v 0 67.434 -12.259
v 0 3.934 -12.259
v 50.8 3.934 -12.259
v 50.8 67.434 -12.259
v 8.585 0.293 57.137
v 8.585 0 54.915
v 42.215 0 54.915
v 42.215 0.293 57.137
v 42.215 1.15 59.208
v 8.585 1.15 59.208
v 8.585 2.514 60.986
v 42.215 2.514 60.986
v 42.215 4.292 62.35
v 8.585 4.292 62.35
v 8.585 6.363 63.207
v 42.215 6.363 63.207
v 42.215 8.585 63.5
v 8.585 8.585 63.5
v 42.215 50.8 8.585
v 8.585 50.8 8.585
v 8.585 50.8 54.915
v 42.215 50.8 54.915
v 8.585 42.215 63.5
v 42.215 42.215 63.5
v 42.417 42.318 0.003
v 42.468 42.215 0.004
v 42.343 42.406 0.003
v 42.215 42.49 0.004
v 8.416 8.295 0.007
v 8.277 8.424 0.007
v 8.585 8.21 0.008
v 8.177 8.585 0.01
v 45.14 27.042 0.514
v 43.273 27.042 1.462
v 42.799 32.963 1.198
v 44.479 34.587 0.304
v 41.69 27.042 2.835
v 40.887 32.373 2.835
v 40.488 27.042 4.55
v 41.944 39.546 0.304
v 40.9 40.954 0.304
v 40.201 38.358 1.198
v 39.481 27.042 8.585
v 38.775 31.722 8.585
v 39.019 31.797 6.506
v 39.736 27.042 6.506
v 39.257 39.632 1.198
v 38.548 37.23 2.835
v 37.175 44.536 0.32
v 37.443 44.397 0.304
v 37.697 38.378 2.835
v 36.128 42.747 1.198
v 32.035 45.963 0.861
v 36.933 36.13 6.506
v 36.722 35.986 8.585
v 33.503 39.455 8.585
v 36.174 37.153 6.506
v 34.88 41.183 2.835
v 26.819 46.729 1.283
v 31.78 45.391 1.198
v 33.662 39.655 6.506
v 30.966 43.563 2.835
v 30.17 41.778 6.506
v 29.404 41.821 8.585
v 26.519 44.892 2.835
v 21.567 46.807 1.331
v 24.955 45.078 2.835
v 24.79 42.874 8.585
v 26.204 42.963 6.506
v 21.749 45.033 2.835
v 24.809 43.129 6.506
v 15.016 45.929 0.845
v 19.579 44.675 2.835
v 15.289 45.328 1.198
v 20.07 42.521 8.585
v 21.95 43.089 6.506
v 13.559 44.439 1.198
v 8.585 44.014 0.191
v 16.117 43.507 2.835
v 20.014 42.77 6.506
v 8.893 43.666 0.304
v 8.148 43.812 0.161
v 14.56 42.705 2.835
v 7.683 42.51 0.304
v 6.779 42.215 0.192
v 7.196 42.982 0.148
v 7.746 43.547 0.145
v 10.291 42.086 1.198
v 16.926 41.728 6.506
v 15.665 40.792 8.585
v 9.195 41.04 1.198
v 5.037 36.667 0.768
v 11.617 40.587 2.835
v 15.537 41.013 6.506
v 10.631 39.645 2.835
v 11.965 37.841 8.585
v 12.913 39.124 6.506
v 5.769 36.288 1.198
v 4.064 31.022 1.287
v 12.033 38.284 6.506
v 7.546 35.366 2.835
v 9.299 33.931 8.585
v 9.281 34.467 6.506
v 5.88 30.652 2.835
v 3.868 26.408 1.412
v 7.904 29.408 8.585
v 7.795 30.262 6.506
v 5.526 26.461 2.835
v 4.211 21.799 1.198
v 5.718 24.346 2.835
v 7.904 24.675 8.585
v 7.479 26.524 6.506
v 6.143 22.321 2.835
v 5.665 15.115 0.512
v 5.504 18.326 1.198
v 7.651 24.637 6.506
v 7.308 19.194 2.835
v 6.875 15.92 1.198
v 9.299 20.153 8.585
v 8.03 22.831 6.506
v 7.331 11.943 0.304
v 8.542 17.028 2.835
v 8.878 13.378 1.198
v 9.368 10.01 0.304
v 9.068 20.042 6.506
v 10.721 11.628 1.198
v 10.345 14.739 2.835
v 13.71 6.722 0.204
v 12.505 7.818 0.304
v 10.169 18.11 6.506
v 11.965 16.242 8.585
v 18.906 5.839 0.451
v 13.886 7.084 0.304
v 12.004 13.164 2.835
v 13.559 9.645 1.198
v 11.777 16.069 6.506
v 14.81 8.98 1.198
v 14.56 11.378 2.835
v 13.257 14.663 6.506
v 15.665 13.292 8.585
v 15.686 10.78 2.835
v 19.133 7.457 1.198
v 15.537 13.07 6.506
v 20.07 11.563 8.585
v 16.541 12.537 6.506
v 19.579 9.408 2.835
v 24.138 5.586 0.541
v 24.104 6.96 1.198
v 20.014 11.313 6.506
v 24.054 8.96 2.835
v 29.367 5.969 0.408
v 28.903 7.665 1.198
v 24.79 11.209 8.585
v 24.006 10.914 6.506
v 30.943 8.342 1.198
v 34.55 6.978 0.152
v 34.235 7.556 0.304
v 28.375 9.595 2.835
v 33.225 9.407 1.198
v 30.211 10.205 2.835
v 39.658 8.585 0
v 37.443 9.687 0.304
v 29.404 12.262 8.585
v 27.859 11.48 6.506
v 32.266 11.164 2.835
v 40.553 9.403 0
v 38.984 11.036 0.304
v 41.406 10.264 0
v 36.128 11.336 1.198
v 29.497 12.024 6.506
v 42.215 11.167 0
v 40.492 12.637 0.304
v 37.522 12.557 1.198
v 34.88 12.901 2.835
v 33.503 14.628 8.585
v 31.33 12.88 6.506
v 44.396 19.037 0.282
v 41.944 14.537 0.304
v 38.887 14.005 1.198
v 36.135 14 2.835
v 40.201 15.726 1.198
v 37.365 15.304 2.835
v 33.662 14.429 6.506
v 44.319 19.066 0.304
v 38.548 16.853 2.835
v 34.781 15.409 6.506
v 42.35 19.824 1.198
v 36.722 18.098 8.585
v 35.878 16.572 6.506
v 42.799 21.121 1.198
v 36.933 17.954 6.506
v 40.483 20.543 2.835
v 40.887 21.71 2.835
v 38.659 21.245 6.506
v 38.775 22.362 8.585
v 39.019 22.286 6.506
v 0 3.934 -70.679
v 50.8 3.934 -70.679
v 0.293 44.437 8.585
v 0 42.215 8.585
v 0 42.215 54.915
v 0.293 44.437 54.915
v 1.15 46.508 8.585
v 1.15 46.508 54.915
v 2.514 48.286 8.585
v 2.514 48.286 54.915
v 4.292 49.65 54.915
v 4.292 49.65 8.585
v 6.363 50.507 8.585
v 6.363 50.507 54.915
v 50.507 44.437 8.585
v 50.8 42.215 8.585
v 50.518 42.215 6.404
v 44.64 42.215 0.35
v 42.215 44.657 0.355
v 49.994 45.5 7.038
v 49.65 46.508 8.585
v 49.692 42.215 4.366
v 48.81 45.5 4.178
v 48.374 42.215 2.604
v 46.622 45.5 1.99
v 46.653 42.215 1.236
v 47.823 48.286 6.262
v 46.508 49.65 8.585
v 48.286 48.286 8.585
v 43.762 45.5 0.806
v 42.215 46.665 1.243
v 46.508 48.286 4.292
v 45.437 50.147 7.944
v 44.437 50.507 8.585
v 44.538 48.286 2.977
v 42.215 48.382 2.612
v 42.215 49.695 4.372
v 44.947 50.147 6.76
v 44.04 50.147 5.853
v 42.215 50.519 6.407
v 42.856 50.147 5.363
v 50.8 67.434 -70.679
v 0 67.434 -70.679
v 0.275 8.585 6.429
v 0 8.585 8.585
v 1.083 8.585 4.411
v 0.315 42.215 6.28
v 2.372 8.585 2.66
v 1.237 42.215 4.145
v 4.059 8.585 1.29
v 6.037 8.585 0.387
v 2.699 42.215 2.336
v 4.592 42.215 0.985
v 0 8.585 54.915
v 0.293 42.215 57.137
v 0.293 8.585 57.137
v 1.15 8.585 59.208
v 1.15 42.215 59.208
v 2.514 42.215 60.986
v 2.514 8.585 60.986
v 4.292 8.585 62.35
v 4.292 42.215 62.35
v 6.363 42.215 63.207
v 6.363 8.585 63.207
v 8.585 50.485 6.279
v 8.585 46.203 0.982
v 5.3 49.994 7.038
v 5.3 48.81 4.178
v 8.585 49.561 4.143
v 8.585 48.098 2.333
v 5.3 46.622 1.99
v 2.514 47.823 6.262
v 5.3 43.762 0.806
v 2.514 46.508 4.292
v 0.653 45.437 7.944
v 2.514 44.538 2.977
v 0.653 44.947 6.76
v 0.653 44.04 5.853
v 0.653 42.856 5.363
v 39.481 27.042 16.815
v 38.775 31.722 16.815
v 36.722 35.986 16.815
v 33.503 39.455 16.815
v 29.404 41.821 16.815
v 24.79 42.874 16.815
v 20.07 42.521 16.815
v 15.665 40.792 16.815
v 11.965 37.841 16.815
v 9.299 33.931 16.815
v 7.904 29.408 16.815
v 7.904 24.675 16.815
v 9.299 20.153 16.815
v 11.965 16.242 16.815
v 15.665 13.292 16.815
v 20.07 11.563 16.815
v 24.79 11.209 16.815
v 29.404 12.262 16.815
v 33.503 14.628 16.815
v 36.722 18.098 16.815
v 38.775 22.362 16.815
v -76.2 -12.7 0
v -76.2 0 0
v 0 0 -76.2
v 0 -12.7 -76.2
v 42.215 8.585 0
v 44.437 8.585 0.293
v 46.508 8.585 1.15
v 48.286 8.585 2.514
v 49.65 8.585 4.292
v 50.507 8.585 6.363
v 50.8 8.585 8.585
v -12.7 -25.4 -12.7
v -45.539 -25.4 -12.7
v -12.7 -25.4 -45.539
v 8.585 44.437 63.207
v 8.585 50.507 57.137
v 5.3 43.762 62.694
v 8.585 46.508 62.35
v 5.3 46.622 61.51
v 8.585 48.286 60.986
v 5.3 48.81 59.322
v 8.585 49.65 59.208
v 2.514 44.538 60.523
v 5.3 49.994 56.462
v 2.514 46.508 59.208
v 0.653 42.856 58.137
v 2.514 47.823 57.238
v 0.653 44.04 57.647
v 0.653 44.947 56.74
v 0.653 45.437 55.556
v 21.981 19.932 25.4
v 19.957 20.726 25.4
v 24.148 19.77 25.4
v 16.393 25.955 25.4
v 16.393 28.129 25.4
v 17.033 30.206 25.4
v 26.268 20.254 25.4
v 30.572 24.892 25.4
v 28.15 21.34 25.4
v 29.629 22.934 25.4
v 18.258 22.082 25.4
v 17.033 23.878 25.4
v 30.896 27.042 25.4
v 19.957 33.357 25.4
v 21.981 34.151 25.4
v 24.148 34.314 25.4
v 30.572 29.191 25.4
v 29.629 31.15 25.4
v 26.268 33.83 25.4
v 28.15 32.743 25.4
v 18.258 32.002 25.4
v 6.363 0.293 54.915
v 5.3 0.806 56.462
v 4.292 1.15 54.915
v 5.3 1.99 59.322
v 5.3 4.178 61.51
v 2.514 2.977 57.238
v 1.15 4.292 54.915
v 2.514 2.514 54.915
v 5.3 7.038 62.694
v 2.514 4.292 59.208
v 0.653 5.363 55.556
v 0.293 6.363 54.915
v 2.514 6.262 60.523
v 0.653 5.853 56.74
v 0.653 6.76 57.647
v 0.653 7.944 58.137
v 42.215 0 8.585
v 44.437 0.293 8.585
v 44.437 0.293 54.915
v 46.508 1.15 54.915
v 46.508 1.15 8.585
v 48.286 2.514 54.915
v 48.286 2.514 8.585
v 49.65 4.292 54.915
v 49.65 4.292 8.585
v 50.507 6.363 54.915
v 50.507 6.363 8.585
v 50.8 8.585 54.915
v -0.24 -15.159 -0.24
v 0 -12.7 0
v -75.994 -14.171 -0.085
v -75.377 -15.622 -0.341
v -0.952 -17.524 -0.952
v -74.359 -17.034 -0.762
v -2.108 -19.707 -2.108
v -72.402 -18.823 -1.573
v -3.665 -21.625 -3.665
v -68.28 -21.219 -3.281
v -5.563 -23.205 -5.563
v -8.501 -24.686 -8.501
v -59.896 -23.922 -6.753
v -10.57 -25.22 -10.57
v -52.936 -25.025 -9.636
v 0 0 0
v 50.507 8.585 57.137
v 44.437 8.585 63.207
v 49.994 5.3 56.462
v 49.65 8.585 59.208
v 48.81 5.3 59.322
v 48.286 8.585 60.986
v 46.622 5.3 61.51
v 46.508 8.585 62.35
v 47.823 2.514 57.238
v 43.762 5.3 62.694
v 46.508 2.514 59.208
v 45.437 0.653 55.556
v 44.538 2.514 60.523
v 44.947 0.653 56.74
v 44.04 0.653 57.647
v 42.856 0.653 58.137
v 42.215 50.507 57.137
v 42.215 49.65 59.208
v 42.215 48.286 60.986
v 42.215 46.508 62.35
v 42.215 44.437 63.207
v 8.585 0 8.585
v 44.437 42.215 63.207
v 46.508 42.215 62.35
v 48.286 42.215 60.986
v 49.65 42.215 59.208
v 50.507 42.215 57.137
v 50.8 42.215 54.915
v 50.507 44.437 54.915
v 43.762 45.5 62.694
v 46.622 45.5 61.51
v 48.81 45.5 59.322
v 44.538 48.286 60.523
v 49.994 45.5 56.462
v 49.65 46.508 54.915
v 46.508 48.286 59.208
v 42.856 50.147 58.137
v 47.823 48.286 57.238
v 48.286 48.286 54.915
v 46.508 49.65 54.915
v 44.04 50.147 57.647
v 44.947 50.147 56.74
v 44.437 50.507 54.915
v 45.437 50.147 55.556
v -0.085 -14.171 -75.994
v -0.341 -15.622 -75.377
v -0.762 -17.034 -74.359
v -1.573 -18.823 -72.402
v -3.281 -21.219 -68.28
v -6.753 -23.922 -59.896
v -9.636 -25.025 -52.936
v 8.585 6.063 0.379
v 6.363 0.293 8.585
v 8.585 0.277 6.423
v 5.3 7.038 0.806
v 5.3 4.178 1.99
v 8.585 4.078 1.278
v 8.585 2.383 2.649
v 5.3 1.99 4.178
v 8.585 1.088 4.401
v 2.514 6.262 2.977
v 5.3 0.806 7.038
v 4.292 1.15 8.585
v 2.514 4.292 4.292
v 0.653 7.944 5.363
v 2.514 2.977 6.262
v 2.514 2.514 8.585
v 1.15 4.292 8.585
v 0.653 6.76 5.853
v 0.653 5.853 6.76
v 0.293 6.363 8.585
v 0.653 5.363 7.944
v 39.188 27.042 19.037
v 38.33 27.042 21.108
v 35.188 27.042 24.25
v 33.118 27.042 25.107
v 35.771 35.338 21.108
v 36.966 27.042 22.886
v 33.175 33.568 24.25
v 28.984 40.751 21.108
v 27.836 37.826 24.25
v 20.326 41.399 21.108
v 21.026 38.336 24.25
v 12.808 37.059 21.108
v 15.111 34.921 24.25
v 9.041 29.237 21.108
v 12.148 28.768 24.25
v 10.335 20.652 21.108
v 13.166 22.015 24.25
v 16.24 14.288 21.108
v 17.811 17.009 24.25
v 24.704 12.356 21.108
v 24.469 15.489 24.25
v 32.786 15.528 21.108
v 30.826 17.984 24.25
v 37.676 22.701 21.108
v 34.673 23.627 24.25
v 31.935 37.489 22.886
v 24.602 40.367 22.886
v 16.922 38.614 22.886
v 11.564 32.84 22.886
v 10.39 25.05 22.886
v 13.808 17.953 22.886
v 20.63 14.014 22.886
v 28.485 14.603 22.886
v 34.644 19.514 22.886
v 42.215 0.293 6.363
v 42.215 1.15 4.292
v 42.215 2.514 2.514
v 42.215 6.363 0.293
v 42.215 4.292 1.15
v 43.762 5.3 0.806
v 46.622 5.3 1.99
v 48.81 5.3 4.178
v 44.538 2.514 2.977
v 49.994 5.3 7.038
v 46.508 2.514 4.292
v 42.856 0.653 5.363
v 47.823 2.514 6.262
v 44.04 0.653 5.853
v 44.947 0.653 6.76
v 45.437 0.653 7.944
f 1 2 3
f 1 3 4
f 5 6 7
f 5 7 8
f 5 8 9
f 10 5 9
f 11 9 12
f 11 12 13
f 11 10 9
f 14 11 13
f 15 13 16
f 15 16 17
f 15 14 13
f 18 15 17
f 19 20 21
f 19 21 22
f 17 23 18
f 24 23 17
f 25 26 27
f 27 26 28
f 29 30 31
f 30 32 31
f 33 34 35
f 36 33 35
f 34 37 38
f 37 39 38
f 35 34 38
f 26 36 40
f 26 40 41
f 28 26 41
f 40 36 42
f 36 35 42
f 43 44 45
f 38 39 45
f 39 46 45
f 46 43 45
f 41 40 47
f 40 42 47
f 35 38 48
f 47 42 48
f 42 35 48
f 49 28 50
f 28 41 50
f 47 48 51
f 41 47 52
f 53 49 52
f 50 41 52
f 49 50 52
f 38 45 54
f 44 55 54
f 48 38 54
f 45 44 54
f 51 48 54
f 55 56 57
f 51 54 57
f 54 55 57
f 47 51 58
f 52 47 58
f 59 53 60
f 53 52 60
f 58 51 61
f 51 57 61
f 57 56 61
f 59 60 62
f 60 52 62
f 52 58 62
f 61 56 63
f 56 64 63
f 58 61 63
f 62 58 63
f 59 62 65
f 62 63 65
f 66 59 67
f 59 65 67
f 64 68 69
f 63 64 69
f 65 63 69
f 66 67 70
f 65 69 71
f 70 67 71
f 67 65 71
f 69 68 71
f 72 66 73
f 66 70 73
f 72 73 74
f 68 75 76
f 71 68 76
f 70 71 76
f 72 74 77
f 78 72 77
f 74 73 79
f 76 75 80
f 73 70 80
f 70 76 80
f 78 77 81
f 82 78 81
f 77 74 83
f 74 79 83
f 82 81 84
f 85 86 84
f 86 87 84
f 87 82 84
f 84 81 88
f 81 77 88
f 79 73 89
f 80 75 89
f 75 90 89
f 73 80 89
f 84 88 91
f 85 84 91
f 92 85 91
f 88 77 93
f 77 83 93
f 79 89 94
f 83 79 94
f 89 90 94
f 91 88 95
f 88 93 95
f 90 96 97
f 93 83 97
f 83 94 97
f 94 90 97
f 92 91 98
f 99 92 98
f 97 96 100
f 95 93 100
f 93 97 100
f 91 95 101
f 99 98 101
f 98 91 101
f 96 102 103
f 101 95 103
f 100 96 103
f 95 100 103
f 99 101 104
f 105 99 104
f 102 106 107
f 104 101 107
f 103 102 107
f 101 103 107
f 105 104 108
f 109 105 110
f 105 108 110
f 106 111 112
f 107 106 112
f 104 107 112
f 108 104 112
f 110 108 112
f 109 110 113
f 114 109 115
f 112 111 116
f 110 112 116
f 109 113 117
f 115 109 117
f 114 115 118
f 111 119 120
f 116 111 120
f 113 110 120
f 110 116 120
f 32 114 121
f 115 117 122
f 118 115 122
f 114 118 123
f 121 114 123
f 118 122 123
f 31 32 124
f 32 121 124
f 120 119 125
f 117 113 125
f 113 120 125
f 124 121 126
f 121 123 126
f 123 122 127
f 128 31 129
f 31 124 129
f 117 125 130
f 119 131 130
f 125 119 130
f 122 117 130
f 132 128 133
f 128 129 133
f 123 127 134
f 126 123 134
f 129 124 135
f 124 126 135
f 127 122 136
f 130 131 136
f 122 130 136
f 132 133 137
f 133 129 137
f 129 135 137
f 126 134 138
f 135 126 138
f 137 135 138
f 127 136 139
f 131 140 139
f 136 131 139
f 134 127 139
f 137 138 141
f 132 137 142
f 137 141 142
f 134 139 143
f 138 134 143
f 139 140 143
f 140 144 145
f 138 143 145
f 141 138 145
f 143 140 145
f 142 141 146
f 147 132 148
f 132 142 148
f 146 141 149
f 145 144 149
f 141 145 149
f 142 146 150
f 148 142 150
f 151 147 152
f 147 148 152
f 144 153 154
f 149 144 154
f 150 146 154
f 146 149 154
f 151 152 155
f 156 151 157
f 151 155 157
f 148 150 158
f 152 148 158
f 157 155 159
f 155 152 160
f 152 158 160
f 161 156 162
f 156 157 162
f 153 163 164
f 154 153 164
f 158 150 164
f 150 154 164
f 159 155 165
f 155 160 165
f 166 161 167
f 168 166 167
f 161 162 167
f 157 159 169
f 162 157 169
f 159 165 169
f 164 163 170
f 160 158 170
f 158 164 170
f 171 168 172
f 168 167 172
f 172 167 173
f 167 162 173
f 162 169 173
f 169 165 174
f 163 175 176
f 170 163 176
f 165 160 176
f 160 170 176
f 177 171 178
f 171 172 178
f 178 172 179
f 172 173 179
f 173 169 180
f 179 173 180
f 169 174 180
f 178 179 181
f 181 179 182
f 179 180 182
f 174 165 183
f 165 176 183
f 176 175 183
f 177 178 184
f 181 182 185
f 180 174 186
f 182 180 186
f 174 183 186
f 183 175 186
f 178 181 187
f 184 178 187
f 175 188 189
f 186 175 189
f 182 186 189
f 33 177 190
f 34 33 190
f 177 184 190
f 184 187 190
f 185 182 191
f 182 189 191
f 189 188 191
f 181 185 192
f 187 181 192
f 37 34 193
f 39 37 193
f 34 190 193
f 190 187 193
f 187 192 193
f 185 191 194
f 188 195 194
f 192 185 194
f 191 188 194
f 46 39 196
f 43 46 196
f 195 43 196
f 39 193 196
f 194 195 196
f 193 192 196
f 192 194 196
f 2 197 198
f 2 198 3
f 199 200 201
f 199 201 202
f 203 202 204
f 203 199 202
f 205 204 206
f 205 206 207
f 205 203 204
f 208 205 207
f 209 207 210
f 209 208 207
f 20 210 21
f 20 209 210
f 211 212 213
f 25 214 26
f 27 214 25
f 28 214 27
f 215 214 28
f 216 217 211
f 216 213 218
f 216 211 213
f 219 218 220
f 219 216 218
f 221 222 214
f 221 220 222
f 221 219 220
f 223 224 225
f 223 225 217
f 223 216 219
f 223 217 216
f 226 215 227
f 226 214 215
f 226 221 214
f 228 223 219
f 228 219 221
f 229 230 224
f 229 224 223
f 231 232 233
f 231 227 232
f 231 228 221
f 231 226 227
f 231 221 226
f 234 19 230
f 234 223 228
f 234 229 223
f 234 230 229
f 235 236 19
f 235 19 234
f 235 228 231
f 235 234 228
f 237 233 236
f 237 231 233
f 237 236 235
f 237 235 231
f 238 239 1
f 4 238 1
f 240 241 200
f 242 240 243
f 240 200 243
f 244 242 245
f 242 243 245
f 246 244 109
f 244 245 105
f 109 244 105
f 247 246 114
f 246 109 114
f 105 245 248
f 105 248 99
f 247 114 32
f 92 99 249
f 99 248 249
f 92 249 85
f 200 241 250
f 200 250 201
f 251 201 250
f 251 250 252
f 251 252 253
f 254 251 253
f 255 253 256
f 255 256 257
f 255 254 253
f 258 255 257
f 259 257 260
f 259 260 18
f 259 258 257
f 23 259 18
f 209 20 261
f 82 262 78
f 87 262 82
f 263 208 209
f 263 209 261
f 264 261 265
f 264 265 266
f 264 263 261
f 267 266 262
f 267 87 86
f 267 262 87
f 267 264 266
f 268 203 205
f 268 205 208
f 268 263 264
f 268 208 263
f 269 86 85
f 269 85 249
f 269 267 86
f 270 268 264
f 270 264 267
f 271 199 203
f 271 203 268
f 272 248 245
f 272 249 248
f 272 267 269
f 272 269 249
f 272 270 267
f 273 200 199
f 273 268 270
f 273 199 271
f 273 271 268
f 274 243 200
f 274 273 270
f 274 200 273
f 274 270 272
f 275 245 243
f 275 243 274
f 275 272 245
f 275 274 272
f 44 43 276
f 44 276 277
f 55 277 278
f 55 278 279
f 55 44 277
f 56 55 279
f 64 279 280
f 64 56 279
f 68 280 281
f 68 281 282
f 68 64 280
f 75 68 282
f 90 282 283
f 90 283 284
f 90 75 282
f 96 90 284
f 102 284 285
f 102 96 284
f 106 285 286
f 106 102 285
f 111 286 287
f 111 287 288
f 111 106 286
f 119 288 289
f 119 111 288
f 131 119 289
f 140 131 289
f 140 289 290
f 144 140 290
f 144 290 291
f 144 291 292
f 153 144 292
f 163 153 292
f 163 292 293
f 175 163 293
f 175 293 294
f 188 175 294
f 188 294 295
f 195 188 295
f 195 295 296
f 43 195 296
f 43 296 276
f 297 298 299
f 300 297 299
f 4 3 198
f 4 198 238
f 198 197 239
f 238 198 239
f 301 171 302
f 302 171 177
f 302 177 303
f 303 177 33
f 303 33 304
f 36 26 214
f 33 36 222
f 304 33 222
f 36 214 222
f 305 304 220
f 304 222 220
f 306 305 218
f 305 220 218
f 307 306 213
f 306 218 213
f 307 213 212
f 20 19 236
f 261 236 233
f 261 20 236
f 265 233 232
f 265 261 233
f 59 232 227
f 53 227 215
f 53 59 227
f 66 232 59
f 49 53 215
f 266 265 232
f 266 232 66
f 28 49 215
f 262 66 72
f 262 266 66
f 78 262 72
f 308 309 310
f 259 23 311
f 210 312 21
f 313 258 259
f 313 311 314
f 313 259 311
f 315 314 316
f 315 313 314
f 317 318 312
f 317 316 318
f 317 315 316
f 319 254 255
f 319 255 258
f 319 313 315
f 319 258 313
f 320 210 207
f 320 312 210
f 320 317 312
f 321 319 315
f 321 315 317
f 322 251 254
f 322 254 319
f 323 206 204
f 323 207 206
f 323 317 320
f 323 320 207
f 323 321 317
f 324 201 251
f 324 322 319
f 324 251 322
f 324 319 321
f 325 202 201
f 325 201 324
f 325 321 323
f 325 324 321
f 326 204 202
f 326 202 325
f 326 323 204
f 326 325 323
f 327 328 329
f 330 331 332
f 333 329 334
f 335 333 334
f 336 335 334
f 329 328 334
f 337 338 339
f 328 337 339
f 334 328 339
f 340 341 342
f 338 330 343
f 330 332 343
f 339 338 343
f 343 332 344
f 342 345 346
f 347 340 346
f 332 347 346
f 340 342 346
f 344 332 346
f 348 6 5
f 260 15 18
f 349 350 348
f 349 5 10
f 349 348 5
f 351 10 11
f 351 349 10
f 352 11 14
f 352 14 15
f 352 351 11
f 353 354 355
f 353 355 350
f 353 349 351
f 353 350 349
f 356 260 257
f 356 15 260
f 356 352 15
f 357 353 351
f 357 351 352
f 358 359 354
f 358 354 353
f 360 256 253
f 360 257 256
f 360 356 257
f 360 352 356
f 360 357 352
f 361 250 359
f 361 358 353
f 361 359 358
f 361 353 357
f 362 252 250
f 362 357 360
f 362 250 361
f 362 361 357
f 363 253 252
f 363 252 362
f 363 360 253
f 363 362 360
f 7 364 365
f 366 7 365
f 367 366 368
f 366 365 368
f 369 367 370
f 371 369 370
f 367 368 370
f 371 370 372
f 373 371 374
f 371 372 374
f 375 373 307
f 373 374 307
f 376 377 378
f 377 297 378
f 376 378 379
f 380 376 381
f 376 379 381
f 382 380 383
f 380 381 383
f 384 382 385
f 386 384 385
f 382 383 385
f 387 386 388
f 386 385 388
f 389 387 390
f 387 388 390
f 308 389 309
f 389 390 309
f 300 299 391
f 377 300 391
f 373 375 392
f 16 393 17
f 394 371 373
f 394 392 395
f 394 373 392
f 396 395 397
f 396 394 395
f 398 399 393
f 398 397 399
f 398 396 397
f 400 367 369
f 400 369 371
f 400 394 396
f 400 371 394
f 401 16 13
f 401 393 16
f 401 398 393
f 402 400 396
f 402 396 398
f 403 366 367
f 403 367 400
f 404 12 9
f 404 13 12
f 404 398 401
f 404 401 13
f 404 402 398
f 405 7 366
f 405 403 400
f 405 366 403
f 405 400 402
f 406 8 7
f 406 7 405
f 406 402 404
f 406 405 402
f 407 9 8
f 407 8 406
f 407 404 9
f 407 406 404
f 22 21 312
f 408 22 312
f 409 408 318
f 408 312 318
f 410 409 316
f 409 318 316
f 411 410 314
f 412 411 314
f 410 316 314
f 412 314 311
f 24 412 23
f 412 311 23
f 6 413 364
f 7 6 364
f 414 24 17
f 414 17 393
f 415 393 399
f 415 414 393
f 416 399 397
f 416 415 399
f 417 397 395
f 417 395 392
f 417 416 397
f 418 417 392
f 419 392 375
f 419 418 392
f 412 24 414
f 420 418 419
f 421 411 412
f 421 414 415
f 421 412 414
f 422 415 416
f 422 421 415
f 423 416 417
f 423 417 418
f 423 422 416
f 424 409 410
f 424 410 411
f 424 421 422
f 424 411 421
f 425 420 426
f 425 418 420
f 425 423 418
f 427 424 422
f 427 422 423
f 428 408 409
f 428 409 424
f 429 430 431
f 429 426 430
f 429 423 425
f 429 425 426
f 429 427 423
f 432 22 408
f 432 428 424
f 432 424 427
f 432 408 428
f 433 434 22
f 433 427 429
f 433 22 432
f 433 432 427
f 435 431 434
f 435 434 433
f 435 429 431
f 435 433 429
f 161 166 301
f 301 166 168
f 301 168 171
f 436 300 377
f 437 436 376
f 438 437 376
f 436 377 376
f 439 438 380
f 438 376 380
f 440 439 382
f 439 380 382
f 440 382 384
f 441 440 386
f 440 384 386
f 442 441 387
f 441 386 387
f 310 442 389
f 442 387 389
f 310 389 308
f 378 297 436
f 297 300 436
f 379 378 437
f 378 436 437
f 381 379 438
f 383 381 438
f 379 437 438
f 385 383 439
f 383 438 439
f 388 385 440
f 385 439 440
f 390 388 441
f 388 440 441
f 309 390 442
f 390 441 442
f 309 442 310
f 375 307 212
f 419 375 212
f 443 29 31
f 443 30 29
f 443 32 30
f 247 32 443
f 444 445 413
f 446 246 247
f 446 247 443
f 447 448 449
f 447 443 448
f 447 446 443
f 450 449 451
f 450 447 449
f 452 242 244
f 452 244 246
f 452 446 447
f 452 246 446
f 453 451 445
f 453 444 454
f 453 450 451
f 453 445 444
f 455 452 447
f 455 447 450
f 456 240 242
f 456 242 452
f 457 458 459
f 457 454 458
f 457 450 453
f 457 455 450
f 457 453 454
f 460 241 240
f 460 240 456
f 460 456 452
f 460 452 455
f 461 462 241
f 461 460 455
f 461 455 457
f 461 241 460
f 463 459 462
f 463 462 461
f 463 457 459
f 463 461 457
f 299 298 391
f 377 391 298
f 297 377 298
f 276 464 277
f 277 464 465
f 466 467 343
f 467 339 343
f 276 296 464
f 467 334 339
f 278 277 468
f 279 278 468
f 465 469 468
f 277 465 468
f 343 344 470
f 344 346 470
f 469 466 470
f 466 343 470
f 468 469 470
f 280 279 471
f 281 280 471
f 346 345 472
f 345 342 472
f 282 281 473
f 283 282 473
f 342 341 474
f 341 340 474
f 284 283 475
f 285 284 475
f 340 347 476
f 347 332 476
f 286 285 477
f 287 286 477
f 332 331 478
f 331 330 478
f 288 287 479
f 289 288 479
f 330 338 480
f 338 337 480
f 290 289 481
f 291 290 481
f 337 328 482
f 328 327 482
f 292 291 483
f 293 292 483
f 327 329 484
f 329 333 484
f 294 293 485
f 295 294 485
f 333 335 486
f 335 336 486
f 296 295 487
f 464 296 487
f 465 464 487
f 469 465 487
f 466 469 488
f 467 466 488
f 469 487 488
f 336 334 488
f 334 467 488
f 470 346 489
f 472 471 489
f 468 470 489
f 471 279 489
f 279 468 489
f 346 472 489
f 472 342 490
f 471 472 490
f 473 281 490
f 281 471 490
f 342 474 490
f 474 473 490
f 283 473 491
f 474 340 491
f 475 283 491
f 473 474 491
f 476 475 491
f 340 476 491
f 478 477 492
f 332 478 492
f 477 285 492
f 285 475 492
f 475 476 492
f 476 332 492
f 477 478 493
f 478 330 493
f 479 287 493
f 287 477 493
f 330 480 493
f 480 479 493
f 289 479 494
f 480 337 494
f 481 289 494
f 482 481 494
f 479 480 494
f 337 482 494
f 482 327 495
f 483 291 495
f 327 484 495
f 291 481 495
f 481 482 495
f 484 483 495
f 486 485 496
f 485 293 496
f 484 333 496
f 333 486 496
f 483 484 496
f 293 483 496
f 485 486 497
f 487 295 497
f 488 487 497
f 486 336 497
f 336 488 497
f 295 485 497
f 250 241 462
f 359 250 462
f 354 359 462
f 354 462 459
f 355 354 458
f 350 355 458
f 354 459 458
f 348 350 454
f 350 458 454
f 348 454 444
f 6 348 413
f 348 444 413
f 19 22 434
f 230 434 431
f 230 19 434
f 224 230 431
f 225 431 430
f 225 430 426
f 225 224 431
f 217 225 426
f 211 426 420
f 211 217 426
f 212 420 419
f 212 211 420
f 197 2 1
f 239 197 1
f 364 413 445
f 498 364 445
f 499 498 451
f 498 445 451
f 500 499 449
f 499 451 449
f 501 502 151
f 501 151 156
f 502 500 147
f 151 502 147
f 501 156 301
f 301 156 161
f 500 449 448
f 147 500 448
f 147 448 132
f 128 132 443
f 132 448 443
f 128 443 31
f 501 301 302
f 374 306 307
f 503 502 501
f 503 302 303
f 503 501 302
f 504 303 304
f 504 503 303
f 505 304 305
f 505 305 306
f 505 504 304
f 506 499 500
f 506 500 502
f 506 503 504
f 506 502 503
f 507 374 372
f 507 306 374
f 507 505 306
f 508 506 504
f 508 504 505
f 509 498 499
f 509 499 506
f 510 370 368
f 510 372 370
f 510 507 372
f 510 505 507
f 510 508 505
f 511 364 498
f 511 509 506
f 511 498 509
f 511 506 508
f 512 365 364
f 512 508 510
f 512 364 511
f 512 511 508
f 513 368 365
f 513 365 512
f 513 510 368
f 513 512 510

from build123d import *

# Parameters (mm, degrees)
F0_W         = 50.8
F0_H         = 50.8
F1_DEPTH     = 63.5
F2_R         = 15.8771693286
F3_DEPTH     = 25.4
F5_T3_DEPTH  = 46.3301131444
F5_T5_DEPTH  = 33.6301131444
F5_T7_DEPTH  = 33.6301131444
F5_S11_W     = 8.5849434278
F5_S11_H     = 8.5849434278
F5_T12_DEPTH = 8.5849434278
F5_S17_W     = 8.5849434278
F5_S17_H     = 8.5849434278
F5_T18_DEPTH = 8.5849434278
F5_S23_W     = 8.5849434278
F5_S23_H     = 8.5849434278
F5_T24_DEPTH = 8.5849434278
F5_S29_W     = 8.5849434278
F5_S29_H     = 8.5849434278
F5_T30_DEPTH = 8.5849434278
F5_S35_W     = 8.5849434278
F5_S35_H     = 8.5849434278
F5_T36_DEPTH = 8.5849434278
F5_S41_W     = 8.5849434278
F5_S41_H     = 8.5849434278
F5_T42_DEPTH = 8.5849434278
F5_S47_W     = 8.5849434278
F5_S47_H     = 8.5849434278
F5_T48_DEPTH = 8.5849434278
F5_S53_W     = 8.5849434278
F5_S53_H     = 8.5849434278
F5_T54_DEPTH = 8.5849434278
F7_DEPTH     = 25.4
F8_R         = 12.7
F9_W         = 63.5
F9_H         = 58.42
F10_DEPTH    = 50.8


# Not quite as in the source:
# - a fillet or chamfer that OpenCascade refuses, or shapes differently, is made with other operations: its cross-section is extruded or revolved along the edge and cut away or added


with BuildPart() as f1:
    # F0 (on Top) → F1 (new body)
    with BuildSketch(Plane.XY):
        with Locations((25.4, 25.4)):
            Rectangle(F0_W, F0_H)
    extrude(amount=F1_DEPTH)


with BuildPart() as f3:
    # F2 (on Top) → F3 (new body)
    with BuildSketch(Plane.XY):
        with Locations((23.6034151167, 27.0417090505)):
            Circle(F2_R)
    extrude(amount=F3_DEPTH)


with BuildPart() as f1_1:
    add(f1.part)

    # F4: cut F3
    add(f3.part, mode=Mode.SUBTRACT)

    # F5: fillet of radius 8.5849434278 on 14 edges, made by hand

    # F5_s1 → F5_t2 (revolve)
    with BuildSketch(Plane.XZ.offset(-27.0417090505)):
        with BuildLine():
            ThreePointArc((39.4805844452, 16.8150565722), (36.9661127313, 22.8855282861), (30.8956410174, 25.4))
            Line((30.8956410174, 25.4), (39.4805844452, 25.4))
            Line((39.4805844452, 25.4), (39.4805844452, 16.8150565722))
        make_face()
    revolve(axis=Axis((23.6034151167, 27.0417090505, 25.4), (0, 0, 1)))

    # F5_s4 → F5_t3 (cut)
    with BuildSketch(Plane.XY.offset(8.5849434278)):
        with BuildLine():
            ThreePointArc((0, 42.2150565722), (2.5144717139, 48.2855282861), (8.5849434278, 50.8))
            Line((8.5849434278, 50.8), (0, 50.8))
            Line((0, 50.8), (0, 42.2150565722))
        make_face()
        with BuildLine():
            ThreePointArc((0, 8.5849434278), (2.5144717139, 2.5144717139), (8.5849434278, 0))
            Line((8.5849434278, 0), (0, 0))
            Line((0, 0), (0, 8.5849434278))
        make_face()
        with BuildLine():
            ThreePointArc((42.2150565722, 50.8), (48.2855282861, 48.2855282861), (50.8, 42.2150565722))
            Line((50.8, 42.2150565722), (50.8, 50.8))
            Line((50.8, 50.8), (42.2150565722, 50.8))
        make_face()
        with BuildLine():
            ThreePointArc((42.2150565722, 0), (48.2855282861, 2.5144717139), (50.8, 8.5849434278))
            Line((50.8, 8.5849434278), (50.8, 0))
            Line((50.8, 0), (42.2150565722, 0))
        make_face()
    extrude(amount=F5_T3_DEPTH, mode=Mode.SUBTRACT)

    # F5_s6 → F5_t5 (cut)
    with BuildSketch(Plane.XZ.offset(-42.2150565722)):
        with BuildLine():
            ThreePointArc((0, 8.5849434278), (2.5144717139, 2.5144717139), (8.5849434278, 0))
            Line((8.5849434278, 0), (0, 0))
            Line((0, 0), (0, 8.5849434278))
        make_face()
        with BuildLine():
            ThreePointArc((0, 54.9150565722), (2.5144717139, 60.9855282861), (8.5849434278, 63.5))
            Line((8.5849434278, 63.5), (0, 63.5))
            Line((0, 63.5), (0, 54.9150565722))
        make_face()
        with BuildLine():
            ThreePointArc((42.2150565722, 0), (48.2855282861, 2.5144717139), (50.8, 8.5849434278))
            Line((50.8, 8.5849434278), (50.8, 0))
            Line((50.8, 0), (42.2150565722, 0))
        make_face()
        with BuildLine():
            ThreePointArc((42.2150565722, 63.5), (48.2855282861, 60.9855282861), (50.8, 54.9150565722))
            Line((50.8, 54.9150565722), (50.8, 63.5))
            Line((50.8, 63.5), (42.2150565722, 63.5))
        make_face()
    extrude(amount=F5_T5_DEPTH, mode=Mode.SUBTRACT)

    # F5_s8 → F5_t7 (cut)
    with BuildSketch(Plane.YZ.offset(8.5849434278)):
        with BuildLine():
            ThreePointArc((50.8, 8.5849434278), (48.2855282861, 2.5144717139), (42.2150565722, 0))
            Line((42.2150565722, 0), (50.8, 0))
            Line((50.8, 0), (50.8, 8.5849434278))
        make_face()
        with BuildLine():
            ThreePointArc((50.8, 54.9150565722), (48.2855282861, 60.9855282861), (42.2150565722, 63.5))
            Line((42.2150565722, 63.5), (50.8, 63.5))
            Line((50.8, 63.5), (50.8, 54.9150565722))
        make_face()
        with BuildLine():
            ThreePointArc((0, 8.5849434278), (2.5144717139, 2.5144717139), (8.5849434278, 0))
            Line((8.5849434278, 0), (0, 0))
            Line((0, 0), (0, 8.5849434278))
        make_face()
        with BuildLine():
            ThreePointArc((0, 54.9150565722), (2.5144717139, 60.9855282861), (8.5849434278, 63.5))
            Line((8.5849434278, 63.5), (0, 63.5))
            Line((0, 63.5), (0, 54.9150565722))
        make_face()
    extrude(amount=F5_T7_DEPTH, mode=Mode.SUBTRACT)


with BuildPart() as f5_tool10:
    # F5_s11 → F5_t12 (new body)
    with BuildSketch(Plane.YZ.offset(8.5849434278)):
        with Locations((46.5075282861, 4.2924717139)):
            Rectangle(F5_S11_W, F5_S11_H)
    extrude(amount=-F5_T12_DEPTH)

    # F5_s13 → F5_t14 (revolve, cut)
    with BuildSketch(Plane(origin=(8.5849434278, 42.2150565722, 8.5849434278), x_dir=(0, -0.7071067812, 0.7071067812), z_dir=(0, -0.7071067812, -0.7071067812))):
        with BuildLine():
            ThreePointArc((0, -8.5849434278), (8.5849434278, 0), (0, 8.5849434278))
            Line((0, 8.5849434278), (0, -8.5849434278))
        make_face()
    revolve(axis=Axis((8.5849434278, 42.2150565722, 8.5849434278), (-1, 0, 0)), mode=Mode.SUBTRACT)


with BuildPart() as f1_2:
    add(f1_1.part)

    # F5_t9: cut F5_tool10
    add(f5_tool10.part, mode=Mode.SUBTRACT)


with BuildPart() as f5_tool16:
    # F5_s17 → F5_t18 (new body)
    with BuildSketch(Plane.YZ.offset(8.5849434278)):
        with Locations((46.5075282861, 59.2075282861)):
            Rectangle(F5_S17_W, F5_S17_H)
    extrude(amount=-F5_T18_DEPTH)

    # F5_s19 → F5_t20 (revolve, cut)
    with BuildSketch(Plane(origin=(8.5849434278, 42.2150565722, 54.9150565722), x_dir=(0, -0.7071067812, -0.7071067812), z_dir=(0, 0.7071067812, -0.7071067812))):
        with BuildLine():
            ThreePointArc((0, -8.5849434278), (8.5849434278, 0), (0, 8.5849434278))
            Line((0, 8.5849434278), (0, -8.5849434278))
        make_face()
    revolve(axis=Axis((8.5849434278, 42.2150565722, 54.9150565722), (-1, 0, 0)), mode=Mode.SUBTRACT)


with BuildPart() as f1_3:
    add(f1_2.part)

    # F5_t15: cut F5_tool16
    add(f5_tool16.part, mode=Mode.SUBTRACT)


with BuildPart() as f5_tool22:
    # F5_s23 → F5_t24 (new body)
    with BuildSketch(Plane.YZ.offset(8.5849434278)):
        with Locations((4.2924717139, 4.2924717139)):
            Rectangle(F5_S23_W, F5_S23_H)
    extrude(amount=-F5_T24_DEPTH)

    # F5_s25 → F5_t26 (revolve, cut)
    with BuildSketch(Plane(origin=(8.5849434278, 8.5849434278, 8.5849434278), x_dir=(0, 0.7071067812, 0.7071067812), z_dir=(0, -0.7071067812, 0.7071067812))):
        with BuildLine():
            ThreePointArc((0, -8.5849434278), (8.5849434278, 0), (0, 8.5849434278))
            Line((0, 8.5849434278), (0, -8.5849434278))
        make_face()
    revolve(axis=Axis((8.5849434278, 8.5849434278, 8.5849434278), (-1, 0, 0)), mode=Mode.SUBTRACT)


with BuildPart() as f1_4:
    add(f1_3.part)

    # F5_t21: cut F5_tool22
    add(f5_tool22.part, mode=Mode.SUBTRACT)


with BuildPart() as f5_tool28:
    # F5_s29 → F5_t30 (new body)
    with BuildSketch(Plane.YZ.offset(8.5849434278)):
        with Locations((4.2924717139, 59.2075282861)):
            Rectangle(F5_S29_W, F5_S29_H)
    extrude(amount=-F5_T30_DEPTH)

    # F5_s31 → F5_t32 (revolve, cut)
    with BuildSketch(Plane(origin=(8.5849434278, 8.5849434278, 54.9150565722), x_dir=(0, 0.7071067812, -0.7071067812), z_dir=(0, 0.7071067812, 0.7071067812))):
        with BuildLine():
            ThreePointArc((0, -8.5849434278), (8.5849434278, 0), (0, 8.5849434278))
            Line((0, 8.5849434278), (0, -8.5849434278))
        make_face()
    revolve(axis=Axis((8.5849434278, 8.5849434278, 54.9150565722), (-1, 0, 0)), mode=Mode.SUBTRACT)


with BuildPart() as f1_5:
    add(f1_4.part)

    # F5_t27: cut F5_tool28
    add(f5_tool28.part, mode=Mode.SUBTRACT)


with BuildPart() as f5_tool34:
    # F5_s35 → F5_t36 (new body)
    with BuildSketch(Plane.XZ.offset(-42.2150565722)):
        with Locations((46.5075282861, 4.2924717139)):
            Rectangle(F5_S35_W, F5_S35_H)
    extrude(amount=-F5_T36_DEPTH)

    # F5_s37 → F5_t38 (revolve, cut)
    with BuildSketch(Plane(origin=(42.2150565722, 42.2150565722, 8.5849434278), x_dir=(-0.7071067812, 0, 0.7071067812), z_dir=(-0.7071067812, 0, -0.7071067812))):
        with BuildLine():
            ThreePointArc((0, -8.5849434278), (8.5849434278, 0), (0, 8.5849434278))
            Line((0, 8.5849434278), (0, -8.5849434278))
        make_face()
    revolve(axis=Axis((42.2150565722, 42.2150565722, 8.5849434278), (0, 1, 0)), mode=Mode.SUBTRACT)


with BuildPart() as f1_6:
    add(f1_5.part)

    # F5_t33: cut F5_tool34
    add(f5_tool34.part, mode=Mode.SUBTRACT)


with BuildPart() as f5_tool40:
    # F5_s41 → F5_t42 (new body)
    with BuildSketch(Plane.XZ.offset(-42.2150565722)):
        with Locations((46.5075282861, 59.2075282861)):
            Rectangle(F5_S41_W, F5_S41_H)
    extrude(amount=-F5_T42_DEPTH)

    # F5_s43 → F5_t44 (revolve, cut)
    with BuildSketch(Plane(origin=(42.2150565722, 42.2150565722, 54.9150565722), x_dir=(-0.7071067812, 0, -0.7071067812), z_dir=(0.7071067812, 0, -0.7071067812))):
        with BuildLine():
            ThreePointArc((0, -8.5849434278), (8.5849434278, 0), (0, 8.5849434278))
            Line((0, 8.5849434278), (0, -8.5849434278))
        make_face()
    revolve(axis=Axis((42.2150565722, 42.2150565722, 54.9150565722), (0, 1, 0)), mode=Mode.SUBTRACT)


with BuildPart() as f1_7:
    add(f1_6.part)

    # F5_t39: cut F5_tool40
    add(f5_tool40.part, mode=Mode.SUBTRACT)


with BuildPart() as f5_tool46:
    # F5_s47 → F5_t48 (new body)
    with BuildSketch(Plane.XZ.offset(-8.5849434278)):
        with Locations((46.5075282861, 4.2924717139)):
            Rectangle(F5_S47_W, F5_S47_H)
    extrude(amount=F5_T48_DEPTH)

    # F5_s49 → F5_t50 (revolve, cut)
    with BuildSketch(Plane(origin=(42.2150565722, 8.5849434278, 8.5849434278), x_dir=(-0.7071067812, 0, 0.7071067812), z_dir=(0.7071067812, 0, 0.7071067812))):
        with BuildLine():
            ThreePointArc((0, -8.5849434278), (8.5849434278, 0), (0, 8.5849434278))
            Line((0, 8.5849434278), (0, -8.5849434278))
        make_face()
    revolve(axis=Axis((42.2150565722, 8.5849434278, 8.5849434278), (0, -1, 0)), mode=Mode.SUBTRACT)


with BuildPart() as f1_8:
    add(f1_7.part)

    # F5_t45: cut F5_tool46
    add(f5_tool46.part, mode=Mode.SUBTRACT)


with BuildPart() as f5_tool52:
    # F5_s53 → F5_t54 (new body)
    with BuildSketch(Plane.XZ.offset(-8.5849434278)):
        with Locations((46.5075282861, 59.2075282861)):
            Rectangle(F5_S53_W, F5_S53_H)
    extrude(amount=F5_T54_DEPTH)

    # F5_s55 → F5_t56 (revolve, cut)
    with BuildSketch(Plane(origin=(42.2150565722, 8.5849434278, 54.9150565722), x_dir=(-0.7071067812, 0, -0.7071067812), z_dir=(-0.7071067812, 0, 0.7071067812))):
        with BuildLine():
            ThreePointArc((0, -8.5849434278), (8.5849434278, 0), (0, 8.5849434278))
            Line((0, 8.5849434278), (0, -8.5849434278))
        make_face()
    revolve(axis=Axis((42.2150565722, 8.5849434278, 54.9150565722), (0, -1, 0)), mode=Mode.SUBTRACT)


with BuildPart() as f1_9:
    add(f1_8.part)

    # F5_t51: cut F5_tool52
    add(f5_tool52.part, mode=Mode.SUBTRACT)

    # F5_s57 → F5_t58 (revolve, cut)
    with BuildSketch(Plane.XZ.offset(-27.0417090505)):
        with BuildLine():
            ThreePointArc((48.065527873, 0), (41.9950561591, 2.5144717139), (39.4805844452, 8.5849434278))
            Line((39.4805844452, 8.5849434278), (39.4805844452, 0))
            Line((39.4805844452, 0), (48.065527873, 0))
        make_face()
    revolve(axis=Axis((23.6034151167, 27.0417090505, 0), (0, 0, 1)), mode=Mode.SUBTRACT)


with BuildPart() as f7:
    # F6 (on Front) → F7 (new body)
    with BuildSketch(Plane.XZ):
        Polygon((0, -76.2), (0, 0), (-76.2, 0), align=None)
    extrude(amount=F7_DEPTH)

    # F8
    f8_edges = [f7.edges().sort_by_distance(p)[0] for p in [
        (0, -25.4, -38.1),
        (-38.1, -25.4, 0),
        (-38.1, -25.4, -38.1),
    ]]
    fillet(f8_edges, radius=F8_R)


with BuildPart() as f10:
    # F9 (on Right) → F10 (new body)
    with BuildSketch(Plane.YZ):
        with Locations((35.6839029118, -41.4694223068)):
            Rectangle(F9_W, F9_H)
    extrude(amount=F10_DEPTH)


solid = Compound([f1_9.part, f7.part, f10.part])
